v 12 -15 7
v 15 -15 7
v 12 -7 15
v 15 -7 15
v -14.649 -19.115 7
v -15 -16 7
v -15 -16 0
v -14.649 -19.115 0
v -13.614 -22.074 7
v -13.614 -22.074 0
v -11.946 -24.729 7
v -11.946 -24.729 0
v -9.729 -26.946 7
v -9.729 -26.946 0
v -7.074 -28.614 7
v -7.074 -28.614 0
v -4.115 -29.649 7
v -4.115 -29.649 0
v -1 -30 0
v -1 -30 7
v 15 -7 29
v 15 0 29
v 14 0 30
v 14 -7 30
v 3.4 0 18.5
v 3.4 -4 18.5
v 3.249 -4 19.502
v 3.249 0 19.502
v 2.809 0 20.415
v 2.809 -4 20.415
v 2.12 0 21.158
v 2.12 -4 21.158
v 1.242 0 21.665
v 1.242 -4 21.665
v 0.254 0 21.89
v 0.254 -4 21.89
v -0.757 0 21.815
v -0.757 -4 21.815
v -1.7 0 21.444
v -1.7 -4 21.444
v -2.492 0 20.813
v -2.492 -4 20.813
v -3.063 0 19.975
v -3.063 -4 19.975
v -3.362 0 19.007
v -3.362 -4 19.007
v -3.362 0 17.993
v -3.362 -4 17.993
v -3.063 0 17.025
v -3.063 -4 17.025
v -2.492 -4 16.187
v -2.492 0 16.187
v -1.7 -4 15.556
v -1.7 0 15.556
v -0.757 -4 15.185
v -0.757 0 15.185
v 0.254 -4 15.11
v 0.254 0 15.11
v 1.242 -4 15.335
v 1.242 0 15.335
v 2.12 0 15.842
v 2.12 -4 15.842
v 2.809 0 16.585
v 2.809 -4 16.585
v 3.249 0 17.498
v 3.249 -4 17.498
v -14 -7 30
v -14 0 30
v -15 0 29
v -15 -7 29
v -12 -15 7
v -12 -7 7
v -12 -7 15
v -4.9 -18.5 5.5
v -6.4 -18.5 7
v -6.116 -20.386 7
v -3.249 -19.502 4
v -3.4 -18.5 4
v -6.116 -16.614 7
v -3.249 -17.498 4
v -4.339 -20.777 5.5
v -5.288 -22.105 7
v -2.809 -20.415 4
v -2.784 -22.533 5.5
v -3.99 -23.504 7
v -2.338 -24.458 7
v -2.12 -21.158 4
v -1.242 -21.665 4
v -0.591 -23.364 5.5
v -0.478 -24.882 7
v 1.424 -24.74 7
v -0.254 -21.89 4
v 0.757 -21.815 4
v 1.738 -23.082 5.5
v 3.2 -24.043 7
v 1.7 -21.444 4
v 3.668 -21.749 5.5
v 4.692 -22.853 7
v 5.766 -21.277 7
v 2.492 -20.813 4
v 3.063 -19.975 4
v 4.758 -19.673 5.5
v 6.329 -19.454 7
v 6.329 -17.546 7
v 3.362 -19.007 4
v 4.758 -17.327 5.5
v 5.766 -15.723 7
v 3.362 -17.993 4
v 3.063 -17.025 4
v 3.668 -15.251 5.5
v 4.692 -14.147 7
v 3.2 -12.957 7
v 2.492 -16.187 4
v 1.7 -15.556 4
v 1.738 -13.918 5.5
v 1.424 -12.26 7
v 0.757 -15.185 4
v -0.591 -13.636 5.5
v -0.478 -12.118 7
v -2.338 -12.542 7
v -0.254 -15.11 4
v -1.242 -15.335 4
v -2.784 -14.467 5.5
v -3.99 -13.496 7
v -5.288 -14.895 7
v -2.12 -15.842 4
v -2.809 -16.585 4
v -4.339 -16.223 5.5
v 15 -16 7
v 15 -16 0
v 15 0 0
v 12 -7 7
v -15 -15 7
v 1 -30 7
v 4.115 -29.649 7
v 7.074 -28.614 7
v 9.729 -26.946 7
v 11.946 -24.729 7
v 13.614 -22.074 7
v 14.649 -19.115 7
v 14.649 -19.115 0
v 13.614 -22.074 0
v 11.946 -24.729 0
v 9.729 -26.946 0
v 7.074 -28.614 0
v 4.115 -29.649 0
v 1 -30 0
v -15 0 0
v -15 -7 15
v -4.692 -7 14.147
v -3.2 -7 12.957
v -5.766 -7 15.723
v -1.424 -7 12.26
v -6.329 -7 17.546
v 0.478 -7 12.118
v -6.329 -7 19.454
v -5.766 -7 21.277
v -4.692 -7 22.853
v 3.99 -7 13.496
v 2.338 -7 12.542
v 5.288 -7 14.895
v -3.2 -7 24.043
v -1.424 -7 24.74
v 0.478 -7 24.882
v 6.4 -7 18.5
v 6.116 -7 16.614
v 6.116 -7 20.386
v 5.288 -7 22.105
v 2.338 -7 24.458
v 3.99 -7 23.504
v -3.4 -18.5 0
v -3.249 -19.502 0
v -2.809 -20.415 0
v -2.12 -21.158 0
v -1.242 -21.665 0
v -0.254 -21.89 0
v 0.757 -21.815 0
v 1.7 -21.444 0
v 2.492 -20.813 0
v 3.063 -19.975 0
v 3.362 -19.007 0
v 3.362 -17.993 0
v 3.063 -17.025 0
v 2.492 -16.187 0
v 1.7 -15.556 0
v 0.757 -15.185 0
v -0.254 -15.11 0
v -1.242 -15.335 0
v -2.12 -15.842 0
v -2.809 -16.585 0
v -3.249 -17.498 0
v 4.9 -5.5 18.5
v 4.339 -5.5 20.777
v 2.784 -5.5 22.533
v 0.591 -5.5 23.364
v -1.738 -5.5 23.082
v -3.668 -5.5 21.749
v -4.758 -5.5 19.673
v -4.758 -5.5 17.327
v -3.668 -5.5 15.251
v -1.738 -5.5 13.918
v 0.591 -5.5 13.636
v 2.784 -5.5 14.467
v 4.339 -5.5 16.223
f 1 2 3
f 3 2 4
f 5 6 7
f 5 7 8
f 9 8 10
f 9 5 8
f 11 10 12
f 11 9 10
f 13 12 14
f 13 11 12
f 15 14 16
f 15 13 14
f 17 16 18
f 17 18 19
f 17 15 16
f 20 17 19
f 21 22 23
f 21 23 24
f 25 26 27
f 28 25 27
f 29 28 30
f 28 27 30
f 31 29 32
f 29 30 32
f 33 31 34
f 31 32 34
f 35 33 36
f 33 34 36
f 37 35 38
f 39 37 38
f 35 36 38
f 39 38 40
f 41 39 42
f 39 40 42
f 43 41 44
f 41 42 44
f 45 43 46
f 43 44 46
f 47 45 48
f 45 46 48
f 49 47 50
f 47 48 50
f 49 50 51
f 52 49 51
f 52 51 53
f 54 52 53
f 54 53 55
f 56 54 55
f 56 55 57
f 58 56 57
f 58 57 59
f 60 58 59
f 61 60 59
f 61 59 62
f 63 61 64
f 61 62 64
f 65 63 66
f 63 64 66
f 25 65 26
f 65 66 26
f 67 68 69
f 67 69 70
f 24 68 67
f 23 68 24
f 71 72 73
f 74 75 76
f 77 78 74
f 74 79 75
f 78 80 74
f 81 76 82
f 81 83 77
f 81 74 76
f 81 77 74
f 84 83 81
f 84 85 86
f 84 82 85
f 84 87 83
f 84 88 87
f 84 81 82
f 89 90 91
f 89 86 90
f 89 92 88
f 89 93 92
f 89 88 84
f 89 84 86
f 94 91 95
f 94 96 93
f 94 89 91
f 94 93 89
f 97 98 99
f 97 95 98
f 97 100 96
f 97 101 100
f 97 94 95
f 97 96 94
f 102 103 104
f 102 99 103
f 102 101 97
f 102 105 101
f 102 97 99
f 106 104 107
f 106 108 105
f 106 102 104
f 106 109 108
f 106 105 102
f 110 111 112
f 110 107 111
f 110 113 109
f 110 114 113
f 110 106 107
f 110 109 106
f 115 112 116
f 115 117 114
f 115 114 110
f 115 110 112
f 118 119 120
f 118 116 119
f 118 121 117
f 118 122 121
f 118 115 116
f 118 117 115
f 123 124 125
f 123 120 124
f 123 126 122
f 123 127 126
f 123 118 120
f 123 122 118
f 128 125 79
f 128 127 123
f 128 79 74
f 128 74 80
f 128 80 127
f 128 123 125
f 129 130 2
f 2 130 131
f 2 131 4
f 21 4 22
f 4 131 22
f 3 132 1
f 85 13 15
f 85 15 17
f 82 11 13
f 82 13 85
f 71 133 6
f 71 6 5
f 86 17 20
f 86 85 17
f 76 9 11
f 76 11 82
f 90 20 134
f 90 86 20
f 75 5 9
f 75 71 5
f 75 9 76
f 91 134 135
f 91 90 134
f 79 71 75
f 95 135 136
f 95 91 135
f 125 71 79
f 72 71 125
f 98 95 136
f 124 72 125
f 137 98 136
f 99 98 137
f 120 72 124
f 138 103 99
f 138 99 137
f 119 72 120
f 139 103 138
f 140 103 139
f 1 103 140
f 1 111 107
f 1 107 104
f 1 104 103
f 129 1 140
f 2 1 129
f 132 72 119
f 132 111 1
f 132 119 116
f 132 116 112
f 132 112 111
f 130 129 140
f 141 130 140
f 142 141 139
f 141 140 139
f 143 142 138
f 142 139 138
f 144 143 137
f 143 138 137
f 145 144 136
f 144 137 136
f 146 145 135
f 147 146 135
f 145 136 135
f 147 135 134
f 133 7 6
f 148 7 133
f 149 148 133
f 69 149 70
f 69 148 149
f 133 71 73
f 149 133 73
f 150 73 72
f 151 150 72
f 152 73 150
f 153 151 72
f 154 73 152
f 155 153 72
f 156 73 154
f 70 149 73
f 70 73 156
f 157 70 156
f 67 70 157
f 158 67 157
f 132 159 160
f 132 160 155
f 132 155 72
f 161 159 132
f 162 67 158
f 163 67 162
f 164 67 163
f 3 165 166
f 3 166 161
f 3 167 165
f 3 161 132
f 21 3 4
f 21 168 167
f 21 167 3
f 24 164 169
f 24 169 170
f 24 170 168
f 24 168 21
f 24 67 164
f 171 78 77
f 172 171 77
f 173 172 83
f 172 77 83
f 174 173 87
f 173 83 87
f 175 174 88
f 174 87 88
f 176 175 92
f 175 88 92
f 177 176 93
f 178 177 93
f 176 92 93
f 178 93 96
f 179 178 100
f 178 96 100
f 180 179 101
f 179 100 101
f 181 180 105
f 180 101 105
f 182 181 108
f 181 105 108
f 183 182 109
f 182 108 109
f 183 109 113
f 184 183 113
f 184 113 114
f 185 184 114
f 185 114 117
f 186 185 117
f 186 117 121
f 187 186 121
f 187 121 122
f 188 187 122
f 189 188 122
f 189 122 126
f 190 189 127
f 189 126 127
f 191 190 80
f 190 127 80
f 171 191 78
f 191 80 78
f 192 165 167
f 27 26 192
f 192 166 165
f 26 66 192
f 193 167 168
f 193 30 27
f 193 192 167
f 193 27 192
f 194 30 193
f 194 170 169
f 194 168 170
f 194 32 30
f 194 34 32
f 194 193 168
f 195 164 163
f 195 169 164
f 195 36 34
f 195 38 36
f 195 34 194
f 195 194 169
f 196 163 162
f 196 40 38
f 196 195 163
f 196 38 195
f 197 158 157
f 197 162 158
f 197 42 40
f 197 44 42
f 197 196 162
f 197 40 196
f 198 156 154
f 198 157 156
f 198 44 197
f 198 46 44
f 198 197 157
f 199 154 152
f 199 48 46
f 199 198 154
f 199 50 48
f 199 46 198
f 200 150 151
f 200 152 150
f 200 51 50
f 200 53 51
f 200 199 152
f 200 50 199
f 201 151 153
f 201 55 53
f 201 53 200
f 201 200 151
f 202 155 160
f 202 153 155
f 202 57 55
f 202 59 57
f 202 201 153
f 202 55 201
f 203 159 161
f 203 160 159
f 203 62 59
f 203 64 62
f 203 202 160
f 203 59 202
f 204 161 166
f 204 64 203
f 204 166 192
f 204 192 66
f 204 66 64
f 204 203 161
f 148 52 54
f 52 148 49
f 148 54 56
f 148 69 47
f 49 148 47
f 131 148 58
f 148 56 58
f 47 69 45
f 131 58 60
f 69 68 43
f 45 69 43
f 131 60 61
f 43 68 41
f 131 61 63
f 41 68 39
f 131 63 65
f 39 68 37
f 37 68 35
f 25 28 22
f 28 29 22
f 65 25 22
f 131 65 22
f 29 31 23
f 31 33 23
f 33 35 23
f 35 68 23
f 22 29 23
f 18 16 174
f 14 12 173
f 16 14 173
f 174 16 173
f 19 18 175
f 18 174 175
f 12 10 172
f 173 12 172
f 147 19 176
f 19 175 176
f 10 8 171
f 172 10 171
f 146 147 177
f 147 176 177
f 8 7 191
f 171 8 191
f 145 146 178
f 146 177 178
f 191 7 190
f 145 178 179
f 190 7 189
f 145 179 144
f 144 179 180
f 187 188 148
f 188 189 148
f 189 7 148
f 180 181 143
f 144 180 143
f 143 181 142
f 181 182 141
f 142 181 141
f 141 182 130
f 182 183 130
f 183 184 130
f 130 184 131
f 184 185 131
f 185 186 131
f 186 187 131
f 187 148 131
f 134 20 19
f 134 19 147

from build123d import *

# Parameters (mm, degrees)
SKETCH_W        = 30
SKETCH_H        = 30
PAD_DEPTH       = 30
FILLET_R        = 14
BOX_W           = 30
BOX_H           = 30
BOX_DEPTH       = 30
SKETCH001_R     = 3.4
POCKET_DEPTH    = 7
SKETCH002_R     = 3.4
POCKET001_DEPTH = 7
CHAMFER_SIZE    = 3
CHAMFER001_SIZE = 1
SKETCH003_W     = 3
SKETCH003_H     = 8
PAD001_DEPTH    = 8
POCKET002_DEPTH = 30.001


with BuildPart() as part:
    # Sketch → Pad (new body)
    with BuildSketch(Plane.XZ):
        with Locations((0, 15)):
            Rectangle(SKETCH_W, SKETCH_H)
    extrude(amount=PAD_DEPTH)

    # Fillet
    fillet_edges = [part.edges().sort_by_distance(p)[0] for p in [
        (15, -30, 15),
        (-15, -30, 15),
    ]]
    fillet(fillet_edges, radius=FILLET_R)

    # Box → Box (cut)
    with BuildSketch(Plane(origin=(-15, -7, 7), x_dir=(1, 0, 0), z_dir=(0, -1, 0))):
        with Locations((15, 15)):
            Rectangle(BOX_W, BOX_H)
    extrude(amount=BOX_DEPTH, mode=Mode.SUBTRACT)

    # Sketch001 (on Face6 of Box) → Pocket (cut)
    with BuildSketch(Plane(origin=(0, -7, 18.5), x_dir=(1, 0, 0), z_dir=(0, -1, 0))):
        Circle(SKETCH001_R)
    extrude(amount=-POCKET_DEPTH, mode=Mode.SUBTRACT)

    # Sketch002 (on Face5 of Pocket) → Pocket001 (cut)
    with BuildSketch(Plane(origin=(0, -18.5, 7), x_dir=(-1, 0, 0), z_dir=(0, 0, 1))):
        Circle(SKETCH002_R)
    extrude(amount=-POCKET001_DEPTH, mode=Mode.SUBTRACT)

    # Chamfer
    chamfer_edges = [part.edges().sort_by_distance(p)[0] for p in [
        (-3.4, -7, 18.5),
        (3.4, -18.5, 7),
    ]]
    chamfer(chamfer_edges, length=CHAMFER_SIZE)

    # Chamfer001
    chamfer001_edges = [part.edges().sort_by_distance(p)[0] for p in [
        (15, -3.5, 30),
        (-15, -3.5, 30),
    ]]
    chamfer(chamfer001_edges, length=CHAMFER001_SIZE)

    # Sketch003 (on Face1 of Chamfer001) → Pad001 (join)
    with BuildSketch(Plane(origin=(0, -7, 7), x_dir=(1, 0, 0), z_dir=(0, -1, 0))):
        with Locations((13.5, 4)):
            Rectangle(SKETCH003_W, SKETCH003_H)
        with Locations((-13.5, 4)):
            Rectangle(SKETCH003_W, SKETCH003_H)
    extrude(amount=PAD001_DEPTH)

    # Sketch004 (on Face22 of Pad001) → Pocket002 (cut, through all)
    with BuildSketch(Plane(origin=(15, -7, 7), x_dir=(0, 0, 1), z_dir=(1, 0, 0))):
        Polygon((0, 8), (8, 0), (8, 8), align=None)
    extrude(amount=-POCKET002_DEPTH, mode=Mode.SUBTRACT)


solid = part.part
